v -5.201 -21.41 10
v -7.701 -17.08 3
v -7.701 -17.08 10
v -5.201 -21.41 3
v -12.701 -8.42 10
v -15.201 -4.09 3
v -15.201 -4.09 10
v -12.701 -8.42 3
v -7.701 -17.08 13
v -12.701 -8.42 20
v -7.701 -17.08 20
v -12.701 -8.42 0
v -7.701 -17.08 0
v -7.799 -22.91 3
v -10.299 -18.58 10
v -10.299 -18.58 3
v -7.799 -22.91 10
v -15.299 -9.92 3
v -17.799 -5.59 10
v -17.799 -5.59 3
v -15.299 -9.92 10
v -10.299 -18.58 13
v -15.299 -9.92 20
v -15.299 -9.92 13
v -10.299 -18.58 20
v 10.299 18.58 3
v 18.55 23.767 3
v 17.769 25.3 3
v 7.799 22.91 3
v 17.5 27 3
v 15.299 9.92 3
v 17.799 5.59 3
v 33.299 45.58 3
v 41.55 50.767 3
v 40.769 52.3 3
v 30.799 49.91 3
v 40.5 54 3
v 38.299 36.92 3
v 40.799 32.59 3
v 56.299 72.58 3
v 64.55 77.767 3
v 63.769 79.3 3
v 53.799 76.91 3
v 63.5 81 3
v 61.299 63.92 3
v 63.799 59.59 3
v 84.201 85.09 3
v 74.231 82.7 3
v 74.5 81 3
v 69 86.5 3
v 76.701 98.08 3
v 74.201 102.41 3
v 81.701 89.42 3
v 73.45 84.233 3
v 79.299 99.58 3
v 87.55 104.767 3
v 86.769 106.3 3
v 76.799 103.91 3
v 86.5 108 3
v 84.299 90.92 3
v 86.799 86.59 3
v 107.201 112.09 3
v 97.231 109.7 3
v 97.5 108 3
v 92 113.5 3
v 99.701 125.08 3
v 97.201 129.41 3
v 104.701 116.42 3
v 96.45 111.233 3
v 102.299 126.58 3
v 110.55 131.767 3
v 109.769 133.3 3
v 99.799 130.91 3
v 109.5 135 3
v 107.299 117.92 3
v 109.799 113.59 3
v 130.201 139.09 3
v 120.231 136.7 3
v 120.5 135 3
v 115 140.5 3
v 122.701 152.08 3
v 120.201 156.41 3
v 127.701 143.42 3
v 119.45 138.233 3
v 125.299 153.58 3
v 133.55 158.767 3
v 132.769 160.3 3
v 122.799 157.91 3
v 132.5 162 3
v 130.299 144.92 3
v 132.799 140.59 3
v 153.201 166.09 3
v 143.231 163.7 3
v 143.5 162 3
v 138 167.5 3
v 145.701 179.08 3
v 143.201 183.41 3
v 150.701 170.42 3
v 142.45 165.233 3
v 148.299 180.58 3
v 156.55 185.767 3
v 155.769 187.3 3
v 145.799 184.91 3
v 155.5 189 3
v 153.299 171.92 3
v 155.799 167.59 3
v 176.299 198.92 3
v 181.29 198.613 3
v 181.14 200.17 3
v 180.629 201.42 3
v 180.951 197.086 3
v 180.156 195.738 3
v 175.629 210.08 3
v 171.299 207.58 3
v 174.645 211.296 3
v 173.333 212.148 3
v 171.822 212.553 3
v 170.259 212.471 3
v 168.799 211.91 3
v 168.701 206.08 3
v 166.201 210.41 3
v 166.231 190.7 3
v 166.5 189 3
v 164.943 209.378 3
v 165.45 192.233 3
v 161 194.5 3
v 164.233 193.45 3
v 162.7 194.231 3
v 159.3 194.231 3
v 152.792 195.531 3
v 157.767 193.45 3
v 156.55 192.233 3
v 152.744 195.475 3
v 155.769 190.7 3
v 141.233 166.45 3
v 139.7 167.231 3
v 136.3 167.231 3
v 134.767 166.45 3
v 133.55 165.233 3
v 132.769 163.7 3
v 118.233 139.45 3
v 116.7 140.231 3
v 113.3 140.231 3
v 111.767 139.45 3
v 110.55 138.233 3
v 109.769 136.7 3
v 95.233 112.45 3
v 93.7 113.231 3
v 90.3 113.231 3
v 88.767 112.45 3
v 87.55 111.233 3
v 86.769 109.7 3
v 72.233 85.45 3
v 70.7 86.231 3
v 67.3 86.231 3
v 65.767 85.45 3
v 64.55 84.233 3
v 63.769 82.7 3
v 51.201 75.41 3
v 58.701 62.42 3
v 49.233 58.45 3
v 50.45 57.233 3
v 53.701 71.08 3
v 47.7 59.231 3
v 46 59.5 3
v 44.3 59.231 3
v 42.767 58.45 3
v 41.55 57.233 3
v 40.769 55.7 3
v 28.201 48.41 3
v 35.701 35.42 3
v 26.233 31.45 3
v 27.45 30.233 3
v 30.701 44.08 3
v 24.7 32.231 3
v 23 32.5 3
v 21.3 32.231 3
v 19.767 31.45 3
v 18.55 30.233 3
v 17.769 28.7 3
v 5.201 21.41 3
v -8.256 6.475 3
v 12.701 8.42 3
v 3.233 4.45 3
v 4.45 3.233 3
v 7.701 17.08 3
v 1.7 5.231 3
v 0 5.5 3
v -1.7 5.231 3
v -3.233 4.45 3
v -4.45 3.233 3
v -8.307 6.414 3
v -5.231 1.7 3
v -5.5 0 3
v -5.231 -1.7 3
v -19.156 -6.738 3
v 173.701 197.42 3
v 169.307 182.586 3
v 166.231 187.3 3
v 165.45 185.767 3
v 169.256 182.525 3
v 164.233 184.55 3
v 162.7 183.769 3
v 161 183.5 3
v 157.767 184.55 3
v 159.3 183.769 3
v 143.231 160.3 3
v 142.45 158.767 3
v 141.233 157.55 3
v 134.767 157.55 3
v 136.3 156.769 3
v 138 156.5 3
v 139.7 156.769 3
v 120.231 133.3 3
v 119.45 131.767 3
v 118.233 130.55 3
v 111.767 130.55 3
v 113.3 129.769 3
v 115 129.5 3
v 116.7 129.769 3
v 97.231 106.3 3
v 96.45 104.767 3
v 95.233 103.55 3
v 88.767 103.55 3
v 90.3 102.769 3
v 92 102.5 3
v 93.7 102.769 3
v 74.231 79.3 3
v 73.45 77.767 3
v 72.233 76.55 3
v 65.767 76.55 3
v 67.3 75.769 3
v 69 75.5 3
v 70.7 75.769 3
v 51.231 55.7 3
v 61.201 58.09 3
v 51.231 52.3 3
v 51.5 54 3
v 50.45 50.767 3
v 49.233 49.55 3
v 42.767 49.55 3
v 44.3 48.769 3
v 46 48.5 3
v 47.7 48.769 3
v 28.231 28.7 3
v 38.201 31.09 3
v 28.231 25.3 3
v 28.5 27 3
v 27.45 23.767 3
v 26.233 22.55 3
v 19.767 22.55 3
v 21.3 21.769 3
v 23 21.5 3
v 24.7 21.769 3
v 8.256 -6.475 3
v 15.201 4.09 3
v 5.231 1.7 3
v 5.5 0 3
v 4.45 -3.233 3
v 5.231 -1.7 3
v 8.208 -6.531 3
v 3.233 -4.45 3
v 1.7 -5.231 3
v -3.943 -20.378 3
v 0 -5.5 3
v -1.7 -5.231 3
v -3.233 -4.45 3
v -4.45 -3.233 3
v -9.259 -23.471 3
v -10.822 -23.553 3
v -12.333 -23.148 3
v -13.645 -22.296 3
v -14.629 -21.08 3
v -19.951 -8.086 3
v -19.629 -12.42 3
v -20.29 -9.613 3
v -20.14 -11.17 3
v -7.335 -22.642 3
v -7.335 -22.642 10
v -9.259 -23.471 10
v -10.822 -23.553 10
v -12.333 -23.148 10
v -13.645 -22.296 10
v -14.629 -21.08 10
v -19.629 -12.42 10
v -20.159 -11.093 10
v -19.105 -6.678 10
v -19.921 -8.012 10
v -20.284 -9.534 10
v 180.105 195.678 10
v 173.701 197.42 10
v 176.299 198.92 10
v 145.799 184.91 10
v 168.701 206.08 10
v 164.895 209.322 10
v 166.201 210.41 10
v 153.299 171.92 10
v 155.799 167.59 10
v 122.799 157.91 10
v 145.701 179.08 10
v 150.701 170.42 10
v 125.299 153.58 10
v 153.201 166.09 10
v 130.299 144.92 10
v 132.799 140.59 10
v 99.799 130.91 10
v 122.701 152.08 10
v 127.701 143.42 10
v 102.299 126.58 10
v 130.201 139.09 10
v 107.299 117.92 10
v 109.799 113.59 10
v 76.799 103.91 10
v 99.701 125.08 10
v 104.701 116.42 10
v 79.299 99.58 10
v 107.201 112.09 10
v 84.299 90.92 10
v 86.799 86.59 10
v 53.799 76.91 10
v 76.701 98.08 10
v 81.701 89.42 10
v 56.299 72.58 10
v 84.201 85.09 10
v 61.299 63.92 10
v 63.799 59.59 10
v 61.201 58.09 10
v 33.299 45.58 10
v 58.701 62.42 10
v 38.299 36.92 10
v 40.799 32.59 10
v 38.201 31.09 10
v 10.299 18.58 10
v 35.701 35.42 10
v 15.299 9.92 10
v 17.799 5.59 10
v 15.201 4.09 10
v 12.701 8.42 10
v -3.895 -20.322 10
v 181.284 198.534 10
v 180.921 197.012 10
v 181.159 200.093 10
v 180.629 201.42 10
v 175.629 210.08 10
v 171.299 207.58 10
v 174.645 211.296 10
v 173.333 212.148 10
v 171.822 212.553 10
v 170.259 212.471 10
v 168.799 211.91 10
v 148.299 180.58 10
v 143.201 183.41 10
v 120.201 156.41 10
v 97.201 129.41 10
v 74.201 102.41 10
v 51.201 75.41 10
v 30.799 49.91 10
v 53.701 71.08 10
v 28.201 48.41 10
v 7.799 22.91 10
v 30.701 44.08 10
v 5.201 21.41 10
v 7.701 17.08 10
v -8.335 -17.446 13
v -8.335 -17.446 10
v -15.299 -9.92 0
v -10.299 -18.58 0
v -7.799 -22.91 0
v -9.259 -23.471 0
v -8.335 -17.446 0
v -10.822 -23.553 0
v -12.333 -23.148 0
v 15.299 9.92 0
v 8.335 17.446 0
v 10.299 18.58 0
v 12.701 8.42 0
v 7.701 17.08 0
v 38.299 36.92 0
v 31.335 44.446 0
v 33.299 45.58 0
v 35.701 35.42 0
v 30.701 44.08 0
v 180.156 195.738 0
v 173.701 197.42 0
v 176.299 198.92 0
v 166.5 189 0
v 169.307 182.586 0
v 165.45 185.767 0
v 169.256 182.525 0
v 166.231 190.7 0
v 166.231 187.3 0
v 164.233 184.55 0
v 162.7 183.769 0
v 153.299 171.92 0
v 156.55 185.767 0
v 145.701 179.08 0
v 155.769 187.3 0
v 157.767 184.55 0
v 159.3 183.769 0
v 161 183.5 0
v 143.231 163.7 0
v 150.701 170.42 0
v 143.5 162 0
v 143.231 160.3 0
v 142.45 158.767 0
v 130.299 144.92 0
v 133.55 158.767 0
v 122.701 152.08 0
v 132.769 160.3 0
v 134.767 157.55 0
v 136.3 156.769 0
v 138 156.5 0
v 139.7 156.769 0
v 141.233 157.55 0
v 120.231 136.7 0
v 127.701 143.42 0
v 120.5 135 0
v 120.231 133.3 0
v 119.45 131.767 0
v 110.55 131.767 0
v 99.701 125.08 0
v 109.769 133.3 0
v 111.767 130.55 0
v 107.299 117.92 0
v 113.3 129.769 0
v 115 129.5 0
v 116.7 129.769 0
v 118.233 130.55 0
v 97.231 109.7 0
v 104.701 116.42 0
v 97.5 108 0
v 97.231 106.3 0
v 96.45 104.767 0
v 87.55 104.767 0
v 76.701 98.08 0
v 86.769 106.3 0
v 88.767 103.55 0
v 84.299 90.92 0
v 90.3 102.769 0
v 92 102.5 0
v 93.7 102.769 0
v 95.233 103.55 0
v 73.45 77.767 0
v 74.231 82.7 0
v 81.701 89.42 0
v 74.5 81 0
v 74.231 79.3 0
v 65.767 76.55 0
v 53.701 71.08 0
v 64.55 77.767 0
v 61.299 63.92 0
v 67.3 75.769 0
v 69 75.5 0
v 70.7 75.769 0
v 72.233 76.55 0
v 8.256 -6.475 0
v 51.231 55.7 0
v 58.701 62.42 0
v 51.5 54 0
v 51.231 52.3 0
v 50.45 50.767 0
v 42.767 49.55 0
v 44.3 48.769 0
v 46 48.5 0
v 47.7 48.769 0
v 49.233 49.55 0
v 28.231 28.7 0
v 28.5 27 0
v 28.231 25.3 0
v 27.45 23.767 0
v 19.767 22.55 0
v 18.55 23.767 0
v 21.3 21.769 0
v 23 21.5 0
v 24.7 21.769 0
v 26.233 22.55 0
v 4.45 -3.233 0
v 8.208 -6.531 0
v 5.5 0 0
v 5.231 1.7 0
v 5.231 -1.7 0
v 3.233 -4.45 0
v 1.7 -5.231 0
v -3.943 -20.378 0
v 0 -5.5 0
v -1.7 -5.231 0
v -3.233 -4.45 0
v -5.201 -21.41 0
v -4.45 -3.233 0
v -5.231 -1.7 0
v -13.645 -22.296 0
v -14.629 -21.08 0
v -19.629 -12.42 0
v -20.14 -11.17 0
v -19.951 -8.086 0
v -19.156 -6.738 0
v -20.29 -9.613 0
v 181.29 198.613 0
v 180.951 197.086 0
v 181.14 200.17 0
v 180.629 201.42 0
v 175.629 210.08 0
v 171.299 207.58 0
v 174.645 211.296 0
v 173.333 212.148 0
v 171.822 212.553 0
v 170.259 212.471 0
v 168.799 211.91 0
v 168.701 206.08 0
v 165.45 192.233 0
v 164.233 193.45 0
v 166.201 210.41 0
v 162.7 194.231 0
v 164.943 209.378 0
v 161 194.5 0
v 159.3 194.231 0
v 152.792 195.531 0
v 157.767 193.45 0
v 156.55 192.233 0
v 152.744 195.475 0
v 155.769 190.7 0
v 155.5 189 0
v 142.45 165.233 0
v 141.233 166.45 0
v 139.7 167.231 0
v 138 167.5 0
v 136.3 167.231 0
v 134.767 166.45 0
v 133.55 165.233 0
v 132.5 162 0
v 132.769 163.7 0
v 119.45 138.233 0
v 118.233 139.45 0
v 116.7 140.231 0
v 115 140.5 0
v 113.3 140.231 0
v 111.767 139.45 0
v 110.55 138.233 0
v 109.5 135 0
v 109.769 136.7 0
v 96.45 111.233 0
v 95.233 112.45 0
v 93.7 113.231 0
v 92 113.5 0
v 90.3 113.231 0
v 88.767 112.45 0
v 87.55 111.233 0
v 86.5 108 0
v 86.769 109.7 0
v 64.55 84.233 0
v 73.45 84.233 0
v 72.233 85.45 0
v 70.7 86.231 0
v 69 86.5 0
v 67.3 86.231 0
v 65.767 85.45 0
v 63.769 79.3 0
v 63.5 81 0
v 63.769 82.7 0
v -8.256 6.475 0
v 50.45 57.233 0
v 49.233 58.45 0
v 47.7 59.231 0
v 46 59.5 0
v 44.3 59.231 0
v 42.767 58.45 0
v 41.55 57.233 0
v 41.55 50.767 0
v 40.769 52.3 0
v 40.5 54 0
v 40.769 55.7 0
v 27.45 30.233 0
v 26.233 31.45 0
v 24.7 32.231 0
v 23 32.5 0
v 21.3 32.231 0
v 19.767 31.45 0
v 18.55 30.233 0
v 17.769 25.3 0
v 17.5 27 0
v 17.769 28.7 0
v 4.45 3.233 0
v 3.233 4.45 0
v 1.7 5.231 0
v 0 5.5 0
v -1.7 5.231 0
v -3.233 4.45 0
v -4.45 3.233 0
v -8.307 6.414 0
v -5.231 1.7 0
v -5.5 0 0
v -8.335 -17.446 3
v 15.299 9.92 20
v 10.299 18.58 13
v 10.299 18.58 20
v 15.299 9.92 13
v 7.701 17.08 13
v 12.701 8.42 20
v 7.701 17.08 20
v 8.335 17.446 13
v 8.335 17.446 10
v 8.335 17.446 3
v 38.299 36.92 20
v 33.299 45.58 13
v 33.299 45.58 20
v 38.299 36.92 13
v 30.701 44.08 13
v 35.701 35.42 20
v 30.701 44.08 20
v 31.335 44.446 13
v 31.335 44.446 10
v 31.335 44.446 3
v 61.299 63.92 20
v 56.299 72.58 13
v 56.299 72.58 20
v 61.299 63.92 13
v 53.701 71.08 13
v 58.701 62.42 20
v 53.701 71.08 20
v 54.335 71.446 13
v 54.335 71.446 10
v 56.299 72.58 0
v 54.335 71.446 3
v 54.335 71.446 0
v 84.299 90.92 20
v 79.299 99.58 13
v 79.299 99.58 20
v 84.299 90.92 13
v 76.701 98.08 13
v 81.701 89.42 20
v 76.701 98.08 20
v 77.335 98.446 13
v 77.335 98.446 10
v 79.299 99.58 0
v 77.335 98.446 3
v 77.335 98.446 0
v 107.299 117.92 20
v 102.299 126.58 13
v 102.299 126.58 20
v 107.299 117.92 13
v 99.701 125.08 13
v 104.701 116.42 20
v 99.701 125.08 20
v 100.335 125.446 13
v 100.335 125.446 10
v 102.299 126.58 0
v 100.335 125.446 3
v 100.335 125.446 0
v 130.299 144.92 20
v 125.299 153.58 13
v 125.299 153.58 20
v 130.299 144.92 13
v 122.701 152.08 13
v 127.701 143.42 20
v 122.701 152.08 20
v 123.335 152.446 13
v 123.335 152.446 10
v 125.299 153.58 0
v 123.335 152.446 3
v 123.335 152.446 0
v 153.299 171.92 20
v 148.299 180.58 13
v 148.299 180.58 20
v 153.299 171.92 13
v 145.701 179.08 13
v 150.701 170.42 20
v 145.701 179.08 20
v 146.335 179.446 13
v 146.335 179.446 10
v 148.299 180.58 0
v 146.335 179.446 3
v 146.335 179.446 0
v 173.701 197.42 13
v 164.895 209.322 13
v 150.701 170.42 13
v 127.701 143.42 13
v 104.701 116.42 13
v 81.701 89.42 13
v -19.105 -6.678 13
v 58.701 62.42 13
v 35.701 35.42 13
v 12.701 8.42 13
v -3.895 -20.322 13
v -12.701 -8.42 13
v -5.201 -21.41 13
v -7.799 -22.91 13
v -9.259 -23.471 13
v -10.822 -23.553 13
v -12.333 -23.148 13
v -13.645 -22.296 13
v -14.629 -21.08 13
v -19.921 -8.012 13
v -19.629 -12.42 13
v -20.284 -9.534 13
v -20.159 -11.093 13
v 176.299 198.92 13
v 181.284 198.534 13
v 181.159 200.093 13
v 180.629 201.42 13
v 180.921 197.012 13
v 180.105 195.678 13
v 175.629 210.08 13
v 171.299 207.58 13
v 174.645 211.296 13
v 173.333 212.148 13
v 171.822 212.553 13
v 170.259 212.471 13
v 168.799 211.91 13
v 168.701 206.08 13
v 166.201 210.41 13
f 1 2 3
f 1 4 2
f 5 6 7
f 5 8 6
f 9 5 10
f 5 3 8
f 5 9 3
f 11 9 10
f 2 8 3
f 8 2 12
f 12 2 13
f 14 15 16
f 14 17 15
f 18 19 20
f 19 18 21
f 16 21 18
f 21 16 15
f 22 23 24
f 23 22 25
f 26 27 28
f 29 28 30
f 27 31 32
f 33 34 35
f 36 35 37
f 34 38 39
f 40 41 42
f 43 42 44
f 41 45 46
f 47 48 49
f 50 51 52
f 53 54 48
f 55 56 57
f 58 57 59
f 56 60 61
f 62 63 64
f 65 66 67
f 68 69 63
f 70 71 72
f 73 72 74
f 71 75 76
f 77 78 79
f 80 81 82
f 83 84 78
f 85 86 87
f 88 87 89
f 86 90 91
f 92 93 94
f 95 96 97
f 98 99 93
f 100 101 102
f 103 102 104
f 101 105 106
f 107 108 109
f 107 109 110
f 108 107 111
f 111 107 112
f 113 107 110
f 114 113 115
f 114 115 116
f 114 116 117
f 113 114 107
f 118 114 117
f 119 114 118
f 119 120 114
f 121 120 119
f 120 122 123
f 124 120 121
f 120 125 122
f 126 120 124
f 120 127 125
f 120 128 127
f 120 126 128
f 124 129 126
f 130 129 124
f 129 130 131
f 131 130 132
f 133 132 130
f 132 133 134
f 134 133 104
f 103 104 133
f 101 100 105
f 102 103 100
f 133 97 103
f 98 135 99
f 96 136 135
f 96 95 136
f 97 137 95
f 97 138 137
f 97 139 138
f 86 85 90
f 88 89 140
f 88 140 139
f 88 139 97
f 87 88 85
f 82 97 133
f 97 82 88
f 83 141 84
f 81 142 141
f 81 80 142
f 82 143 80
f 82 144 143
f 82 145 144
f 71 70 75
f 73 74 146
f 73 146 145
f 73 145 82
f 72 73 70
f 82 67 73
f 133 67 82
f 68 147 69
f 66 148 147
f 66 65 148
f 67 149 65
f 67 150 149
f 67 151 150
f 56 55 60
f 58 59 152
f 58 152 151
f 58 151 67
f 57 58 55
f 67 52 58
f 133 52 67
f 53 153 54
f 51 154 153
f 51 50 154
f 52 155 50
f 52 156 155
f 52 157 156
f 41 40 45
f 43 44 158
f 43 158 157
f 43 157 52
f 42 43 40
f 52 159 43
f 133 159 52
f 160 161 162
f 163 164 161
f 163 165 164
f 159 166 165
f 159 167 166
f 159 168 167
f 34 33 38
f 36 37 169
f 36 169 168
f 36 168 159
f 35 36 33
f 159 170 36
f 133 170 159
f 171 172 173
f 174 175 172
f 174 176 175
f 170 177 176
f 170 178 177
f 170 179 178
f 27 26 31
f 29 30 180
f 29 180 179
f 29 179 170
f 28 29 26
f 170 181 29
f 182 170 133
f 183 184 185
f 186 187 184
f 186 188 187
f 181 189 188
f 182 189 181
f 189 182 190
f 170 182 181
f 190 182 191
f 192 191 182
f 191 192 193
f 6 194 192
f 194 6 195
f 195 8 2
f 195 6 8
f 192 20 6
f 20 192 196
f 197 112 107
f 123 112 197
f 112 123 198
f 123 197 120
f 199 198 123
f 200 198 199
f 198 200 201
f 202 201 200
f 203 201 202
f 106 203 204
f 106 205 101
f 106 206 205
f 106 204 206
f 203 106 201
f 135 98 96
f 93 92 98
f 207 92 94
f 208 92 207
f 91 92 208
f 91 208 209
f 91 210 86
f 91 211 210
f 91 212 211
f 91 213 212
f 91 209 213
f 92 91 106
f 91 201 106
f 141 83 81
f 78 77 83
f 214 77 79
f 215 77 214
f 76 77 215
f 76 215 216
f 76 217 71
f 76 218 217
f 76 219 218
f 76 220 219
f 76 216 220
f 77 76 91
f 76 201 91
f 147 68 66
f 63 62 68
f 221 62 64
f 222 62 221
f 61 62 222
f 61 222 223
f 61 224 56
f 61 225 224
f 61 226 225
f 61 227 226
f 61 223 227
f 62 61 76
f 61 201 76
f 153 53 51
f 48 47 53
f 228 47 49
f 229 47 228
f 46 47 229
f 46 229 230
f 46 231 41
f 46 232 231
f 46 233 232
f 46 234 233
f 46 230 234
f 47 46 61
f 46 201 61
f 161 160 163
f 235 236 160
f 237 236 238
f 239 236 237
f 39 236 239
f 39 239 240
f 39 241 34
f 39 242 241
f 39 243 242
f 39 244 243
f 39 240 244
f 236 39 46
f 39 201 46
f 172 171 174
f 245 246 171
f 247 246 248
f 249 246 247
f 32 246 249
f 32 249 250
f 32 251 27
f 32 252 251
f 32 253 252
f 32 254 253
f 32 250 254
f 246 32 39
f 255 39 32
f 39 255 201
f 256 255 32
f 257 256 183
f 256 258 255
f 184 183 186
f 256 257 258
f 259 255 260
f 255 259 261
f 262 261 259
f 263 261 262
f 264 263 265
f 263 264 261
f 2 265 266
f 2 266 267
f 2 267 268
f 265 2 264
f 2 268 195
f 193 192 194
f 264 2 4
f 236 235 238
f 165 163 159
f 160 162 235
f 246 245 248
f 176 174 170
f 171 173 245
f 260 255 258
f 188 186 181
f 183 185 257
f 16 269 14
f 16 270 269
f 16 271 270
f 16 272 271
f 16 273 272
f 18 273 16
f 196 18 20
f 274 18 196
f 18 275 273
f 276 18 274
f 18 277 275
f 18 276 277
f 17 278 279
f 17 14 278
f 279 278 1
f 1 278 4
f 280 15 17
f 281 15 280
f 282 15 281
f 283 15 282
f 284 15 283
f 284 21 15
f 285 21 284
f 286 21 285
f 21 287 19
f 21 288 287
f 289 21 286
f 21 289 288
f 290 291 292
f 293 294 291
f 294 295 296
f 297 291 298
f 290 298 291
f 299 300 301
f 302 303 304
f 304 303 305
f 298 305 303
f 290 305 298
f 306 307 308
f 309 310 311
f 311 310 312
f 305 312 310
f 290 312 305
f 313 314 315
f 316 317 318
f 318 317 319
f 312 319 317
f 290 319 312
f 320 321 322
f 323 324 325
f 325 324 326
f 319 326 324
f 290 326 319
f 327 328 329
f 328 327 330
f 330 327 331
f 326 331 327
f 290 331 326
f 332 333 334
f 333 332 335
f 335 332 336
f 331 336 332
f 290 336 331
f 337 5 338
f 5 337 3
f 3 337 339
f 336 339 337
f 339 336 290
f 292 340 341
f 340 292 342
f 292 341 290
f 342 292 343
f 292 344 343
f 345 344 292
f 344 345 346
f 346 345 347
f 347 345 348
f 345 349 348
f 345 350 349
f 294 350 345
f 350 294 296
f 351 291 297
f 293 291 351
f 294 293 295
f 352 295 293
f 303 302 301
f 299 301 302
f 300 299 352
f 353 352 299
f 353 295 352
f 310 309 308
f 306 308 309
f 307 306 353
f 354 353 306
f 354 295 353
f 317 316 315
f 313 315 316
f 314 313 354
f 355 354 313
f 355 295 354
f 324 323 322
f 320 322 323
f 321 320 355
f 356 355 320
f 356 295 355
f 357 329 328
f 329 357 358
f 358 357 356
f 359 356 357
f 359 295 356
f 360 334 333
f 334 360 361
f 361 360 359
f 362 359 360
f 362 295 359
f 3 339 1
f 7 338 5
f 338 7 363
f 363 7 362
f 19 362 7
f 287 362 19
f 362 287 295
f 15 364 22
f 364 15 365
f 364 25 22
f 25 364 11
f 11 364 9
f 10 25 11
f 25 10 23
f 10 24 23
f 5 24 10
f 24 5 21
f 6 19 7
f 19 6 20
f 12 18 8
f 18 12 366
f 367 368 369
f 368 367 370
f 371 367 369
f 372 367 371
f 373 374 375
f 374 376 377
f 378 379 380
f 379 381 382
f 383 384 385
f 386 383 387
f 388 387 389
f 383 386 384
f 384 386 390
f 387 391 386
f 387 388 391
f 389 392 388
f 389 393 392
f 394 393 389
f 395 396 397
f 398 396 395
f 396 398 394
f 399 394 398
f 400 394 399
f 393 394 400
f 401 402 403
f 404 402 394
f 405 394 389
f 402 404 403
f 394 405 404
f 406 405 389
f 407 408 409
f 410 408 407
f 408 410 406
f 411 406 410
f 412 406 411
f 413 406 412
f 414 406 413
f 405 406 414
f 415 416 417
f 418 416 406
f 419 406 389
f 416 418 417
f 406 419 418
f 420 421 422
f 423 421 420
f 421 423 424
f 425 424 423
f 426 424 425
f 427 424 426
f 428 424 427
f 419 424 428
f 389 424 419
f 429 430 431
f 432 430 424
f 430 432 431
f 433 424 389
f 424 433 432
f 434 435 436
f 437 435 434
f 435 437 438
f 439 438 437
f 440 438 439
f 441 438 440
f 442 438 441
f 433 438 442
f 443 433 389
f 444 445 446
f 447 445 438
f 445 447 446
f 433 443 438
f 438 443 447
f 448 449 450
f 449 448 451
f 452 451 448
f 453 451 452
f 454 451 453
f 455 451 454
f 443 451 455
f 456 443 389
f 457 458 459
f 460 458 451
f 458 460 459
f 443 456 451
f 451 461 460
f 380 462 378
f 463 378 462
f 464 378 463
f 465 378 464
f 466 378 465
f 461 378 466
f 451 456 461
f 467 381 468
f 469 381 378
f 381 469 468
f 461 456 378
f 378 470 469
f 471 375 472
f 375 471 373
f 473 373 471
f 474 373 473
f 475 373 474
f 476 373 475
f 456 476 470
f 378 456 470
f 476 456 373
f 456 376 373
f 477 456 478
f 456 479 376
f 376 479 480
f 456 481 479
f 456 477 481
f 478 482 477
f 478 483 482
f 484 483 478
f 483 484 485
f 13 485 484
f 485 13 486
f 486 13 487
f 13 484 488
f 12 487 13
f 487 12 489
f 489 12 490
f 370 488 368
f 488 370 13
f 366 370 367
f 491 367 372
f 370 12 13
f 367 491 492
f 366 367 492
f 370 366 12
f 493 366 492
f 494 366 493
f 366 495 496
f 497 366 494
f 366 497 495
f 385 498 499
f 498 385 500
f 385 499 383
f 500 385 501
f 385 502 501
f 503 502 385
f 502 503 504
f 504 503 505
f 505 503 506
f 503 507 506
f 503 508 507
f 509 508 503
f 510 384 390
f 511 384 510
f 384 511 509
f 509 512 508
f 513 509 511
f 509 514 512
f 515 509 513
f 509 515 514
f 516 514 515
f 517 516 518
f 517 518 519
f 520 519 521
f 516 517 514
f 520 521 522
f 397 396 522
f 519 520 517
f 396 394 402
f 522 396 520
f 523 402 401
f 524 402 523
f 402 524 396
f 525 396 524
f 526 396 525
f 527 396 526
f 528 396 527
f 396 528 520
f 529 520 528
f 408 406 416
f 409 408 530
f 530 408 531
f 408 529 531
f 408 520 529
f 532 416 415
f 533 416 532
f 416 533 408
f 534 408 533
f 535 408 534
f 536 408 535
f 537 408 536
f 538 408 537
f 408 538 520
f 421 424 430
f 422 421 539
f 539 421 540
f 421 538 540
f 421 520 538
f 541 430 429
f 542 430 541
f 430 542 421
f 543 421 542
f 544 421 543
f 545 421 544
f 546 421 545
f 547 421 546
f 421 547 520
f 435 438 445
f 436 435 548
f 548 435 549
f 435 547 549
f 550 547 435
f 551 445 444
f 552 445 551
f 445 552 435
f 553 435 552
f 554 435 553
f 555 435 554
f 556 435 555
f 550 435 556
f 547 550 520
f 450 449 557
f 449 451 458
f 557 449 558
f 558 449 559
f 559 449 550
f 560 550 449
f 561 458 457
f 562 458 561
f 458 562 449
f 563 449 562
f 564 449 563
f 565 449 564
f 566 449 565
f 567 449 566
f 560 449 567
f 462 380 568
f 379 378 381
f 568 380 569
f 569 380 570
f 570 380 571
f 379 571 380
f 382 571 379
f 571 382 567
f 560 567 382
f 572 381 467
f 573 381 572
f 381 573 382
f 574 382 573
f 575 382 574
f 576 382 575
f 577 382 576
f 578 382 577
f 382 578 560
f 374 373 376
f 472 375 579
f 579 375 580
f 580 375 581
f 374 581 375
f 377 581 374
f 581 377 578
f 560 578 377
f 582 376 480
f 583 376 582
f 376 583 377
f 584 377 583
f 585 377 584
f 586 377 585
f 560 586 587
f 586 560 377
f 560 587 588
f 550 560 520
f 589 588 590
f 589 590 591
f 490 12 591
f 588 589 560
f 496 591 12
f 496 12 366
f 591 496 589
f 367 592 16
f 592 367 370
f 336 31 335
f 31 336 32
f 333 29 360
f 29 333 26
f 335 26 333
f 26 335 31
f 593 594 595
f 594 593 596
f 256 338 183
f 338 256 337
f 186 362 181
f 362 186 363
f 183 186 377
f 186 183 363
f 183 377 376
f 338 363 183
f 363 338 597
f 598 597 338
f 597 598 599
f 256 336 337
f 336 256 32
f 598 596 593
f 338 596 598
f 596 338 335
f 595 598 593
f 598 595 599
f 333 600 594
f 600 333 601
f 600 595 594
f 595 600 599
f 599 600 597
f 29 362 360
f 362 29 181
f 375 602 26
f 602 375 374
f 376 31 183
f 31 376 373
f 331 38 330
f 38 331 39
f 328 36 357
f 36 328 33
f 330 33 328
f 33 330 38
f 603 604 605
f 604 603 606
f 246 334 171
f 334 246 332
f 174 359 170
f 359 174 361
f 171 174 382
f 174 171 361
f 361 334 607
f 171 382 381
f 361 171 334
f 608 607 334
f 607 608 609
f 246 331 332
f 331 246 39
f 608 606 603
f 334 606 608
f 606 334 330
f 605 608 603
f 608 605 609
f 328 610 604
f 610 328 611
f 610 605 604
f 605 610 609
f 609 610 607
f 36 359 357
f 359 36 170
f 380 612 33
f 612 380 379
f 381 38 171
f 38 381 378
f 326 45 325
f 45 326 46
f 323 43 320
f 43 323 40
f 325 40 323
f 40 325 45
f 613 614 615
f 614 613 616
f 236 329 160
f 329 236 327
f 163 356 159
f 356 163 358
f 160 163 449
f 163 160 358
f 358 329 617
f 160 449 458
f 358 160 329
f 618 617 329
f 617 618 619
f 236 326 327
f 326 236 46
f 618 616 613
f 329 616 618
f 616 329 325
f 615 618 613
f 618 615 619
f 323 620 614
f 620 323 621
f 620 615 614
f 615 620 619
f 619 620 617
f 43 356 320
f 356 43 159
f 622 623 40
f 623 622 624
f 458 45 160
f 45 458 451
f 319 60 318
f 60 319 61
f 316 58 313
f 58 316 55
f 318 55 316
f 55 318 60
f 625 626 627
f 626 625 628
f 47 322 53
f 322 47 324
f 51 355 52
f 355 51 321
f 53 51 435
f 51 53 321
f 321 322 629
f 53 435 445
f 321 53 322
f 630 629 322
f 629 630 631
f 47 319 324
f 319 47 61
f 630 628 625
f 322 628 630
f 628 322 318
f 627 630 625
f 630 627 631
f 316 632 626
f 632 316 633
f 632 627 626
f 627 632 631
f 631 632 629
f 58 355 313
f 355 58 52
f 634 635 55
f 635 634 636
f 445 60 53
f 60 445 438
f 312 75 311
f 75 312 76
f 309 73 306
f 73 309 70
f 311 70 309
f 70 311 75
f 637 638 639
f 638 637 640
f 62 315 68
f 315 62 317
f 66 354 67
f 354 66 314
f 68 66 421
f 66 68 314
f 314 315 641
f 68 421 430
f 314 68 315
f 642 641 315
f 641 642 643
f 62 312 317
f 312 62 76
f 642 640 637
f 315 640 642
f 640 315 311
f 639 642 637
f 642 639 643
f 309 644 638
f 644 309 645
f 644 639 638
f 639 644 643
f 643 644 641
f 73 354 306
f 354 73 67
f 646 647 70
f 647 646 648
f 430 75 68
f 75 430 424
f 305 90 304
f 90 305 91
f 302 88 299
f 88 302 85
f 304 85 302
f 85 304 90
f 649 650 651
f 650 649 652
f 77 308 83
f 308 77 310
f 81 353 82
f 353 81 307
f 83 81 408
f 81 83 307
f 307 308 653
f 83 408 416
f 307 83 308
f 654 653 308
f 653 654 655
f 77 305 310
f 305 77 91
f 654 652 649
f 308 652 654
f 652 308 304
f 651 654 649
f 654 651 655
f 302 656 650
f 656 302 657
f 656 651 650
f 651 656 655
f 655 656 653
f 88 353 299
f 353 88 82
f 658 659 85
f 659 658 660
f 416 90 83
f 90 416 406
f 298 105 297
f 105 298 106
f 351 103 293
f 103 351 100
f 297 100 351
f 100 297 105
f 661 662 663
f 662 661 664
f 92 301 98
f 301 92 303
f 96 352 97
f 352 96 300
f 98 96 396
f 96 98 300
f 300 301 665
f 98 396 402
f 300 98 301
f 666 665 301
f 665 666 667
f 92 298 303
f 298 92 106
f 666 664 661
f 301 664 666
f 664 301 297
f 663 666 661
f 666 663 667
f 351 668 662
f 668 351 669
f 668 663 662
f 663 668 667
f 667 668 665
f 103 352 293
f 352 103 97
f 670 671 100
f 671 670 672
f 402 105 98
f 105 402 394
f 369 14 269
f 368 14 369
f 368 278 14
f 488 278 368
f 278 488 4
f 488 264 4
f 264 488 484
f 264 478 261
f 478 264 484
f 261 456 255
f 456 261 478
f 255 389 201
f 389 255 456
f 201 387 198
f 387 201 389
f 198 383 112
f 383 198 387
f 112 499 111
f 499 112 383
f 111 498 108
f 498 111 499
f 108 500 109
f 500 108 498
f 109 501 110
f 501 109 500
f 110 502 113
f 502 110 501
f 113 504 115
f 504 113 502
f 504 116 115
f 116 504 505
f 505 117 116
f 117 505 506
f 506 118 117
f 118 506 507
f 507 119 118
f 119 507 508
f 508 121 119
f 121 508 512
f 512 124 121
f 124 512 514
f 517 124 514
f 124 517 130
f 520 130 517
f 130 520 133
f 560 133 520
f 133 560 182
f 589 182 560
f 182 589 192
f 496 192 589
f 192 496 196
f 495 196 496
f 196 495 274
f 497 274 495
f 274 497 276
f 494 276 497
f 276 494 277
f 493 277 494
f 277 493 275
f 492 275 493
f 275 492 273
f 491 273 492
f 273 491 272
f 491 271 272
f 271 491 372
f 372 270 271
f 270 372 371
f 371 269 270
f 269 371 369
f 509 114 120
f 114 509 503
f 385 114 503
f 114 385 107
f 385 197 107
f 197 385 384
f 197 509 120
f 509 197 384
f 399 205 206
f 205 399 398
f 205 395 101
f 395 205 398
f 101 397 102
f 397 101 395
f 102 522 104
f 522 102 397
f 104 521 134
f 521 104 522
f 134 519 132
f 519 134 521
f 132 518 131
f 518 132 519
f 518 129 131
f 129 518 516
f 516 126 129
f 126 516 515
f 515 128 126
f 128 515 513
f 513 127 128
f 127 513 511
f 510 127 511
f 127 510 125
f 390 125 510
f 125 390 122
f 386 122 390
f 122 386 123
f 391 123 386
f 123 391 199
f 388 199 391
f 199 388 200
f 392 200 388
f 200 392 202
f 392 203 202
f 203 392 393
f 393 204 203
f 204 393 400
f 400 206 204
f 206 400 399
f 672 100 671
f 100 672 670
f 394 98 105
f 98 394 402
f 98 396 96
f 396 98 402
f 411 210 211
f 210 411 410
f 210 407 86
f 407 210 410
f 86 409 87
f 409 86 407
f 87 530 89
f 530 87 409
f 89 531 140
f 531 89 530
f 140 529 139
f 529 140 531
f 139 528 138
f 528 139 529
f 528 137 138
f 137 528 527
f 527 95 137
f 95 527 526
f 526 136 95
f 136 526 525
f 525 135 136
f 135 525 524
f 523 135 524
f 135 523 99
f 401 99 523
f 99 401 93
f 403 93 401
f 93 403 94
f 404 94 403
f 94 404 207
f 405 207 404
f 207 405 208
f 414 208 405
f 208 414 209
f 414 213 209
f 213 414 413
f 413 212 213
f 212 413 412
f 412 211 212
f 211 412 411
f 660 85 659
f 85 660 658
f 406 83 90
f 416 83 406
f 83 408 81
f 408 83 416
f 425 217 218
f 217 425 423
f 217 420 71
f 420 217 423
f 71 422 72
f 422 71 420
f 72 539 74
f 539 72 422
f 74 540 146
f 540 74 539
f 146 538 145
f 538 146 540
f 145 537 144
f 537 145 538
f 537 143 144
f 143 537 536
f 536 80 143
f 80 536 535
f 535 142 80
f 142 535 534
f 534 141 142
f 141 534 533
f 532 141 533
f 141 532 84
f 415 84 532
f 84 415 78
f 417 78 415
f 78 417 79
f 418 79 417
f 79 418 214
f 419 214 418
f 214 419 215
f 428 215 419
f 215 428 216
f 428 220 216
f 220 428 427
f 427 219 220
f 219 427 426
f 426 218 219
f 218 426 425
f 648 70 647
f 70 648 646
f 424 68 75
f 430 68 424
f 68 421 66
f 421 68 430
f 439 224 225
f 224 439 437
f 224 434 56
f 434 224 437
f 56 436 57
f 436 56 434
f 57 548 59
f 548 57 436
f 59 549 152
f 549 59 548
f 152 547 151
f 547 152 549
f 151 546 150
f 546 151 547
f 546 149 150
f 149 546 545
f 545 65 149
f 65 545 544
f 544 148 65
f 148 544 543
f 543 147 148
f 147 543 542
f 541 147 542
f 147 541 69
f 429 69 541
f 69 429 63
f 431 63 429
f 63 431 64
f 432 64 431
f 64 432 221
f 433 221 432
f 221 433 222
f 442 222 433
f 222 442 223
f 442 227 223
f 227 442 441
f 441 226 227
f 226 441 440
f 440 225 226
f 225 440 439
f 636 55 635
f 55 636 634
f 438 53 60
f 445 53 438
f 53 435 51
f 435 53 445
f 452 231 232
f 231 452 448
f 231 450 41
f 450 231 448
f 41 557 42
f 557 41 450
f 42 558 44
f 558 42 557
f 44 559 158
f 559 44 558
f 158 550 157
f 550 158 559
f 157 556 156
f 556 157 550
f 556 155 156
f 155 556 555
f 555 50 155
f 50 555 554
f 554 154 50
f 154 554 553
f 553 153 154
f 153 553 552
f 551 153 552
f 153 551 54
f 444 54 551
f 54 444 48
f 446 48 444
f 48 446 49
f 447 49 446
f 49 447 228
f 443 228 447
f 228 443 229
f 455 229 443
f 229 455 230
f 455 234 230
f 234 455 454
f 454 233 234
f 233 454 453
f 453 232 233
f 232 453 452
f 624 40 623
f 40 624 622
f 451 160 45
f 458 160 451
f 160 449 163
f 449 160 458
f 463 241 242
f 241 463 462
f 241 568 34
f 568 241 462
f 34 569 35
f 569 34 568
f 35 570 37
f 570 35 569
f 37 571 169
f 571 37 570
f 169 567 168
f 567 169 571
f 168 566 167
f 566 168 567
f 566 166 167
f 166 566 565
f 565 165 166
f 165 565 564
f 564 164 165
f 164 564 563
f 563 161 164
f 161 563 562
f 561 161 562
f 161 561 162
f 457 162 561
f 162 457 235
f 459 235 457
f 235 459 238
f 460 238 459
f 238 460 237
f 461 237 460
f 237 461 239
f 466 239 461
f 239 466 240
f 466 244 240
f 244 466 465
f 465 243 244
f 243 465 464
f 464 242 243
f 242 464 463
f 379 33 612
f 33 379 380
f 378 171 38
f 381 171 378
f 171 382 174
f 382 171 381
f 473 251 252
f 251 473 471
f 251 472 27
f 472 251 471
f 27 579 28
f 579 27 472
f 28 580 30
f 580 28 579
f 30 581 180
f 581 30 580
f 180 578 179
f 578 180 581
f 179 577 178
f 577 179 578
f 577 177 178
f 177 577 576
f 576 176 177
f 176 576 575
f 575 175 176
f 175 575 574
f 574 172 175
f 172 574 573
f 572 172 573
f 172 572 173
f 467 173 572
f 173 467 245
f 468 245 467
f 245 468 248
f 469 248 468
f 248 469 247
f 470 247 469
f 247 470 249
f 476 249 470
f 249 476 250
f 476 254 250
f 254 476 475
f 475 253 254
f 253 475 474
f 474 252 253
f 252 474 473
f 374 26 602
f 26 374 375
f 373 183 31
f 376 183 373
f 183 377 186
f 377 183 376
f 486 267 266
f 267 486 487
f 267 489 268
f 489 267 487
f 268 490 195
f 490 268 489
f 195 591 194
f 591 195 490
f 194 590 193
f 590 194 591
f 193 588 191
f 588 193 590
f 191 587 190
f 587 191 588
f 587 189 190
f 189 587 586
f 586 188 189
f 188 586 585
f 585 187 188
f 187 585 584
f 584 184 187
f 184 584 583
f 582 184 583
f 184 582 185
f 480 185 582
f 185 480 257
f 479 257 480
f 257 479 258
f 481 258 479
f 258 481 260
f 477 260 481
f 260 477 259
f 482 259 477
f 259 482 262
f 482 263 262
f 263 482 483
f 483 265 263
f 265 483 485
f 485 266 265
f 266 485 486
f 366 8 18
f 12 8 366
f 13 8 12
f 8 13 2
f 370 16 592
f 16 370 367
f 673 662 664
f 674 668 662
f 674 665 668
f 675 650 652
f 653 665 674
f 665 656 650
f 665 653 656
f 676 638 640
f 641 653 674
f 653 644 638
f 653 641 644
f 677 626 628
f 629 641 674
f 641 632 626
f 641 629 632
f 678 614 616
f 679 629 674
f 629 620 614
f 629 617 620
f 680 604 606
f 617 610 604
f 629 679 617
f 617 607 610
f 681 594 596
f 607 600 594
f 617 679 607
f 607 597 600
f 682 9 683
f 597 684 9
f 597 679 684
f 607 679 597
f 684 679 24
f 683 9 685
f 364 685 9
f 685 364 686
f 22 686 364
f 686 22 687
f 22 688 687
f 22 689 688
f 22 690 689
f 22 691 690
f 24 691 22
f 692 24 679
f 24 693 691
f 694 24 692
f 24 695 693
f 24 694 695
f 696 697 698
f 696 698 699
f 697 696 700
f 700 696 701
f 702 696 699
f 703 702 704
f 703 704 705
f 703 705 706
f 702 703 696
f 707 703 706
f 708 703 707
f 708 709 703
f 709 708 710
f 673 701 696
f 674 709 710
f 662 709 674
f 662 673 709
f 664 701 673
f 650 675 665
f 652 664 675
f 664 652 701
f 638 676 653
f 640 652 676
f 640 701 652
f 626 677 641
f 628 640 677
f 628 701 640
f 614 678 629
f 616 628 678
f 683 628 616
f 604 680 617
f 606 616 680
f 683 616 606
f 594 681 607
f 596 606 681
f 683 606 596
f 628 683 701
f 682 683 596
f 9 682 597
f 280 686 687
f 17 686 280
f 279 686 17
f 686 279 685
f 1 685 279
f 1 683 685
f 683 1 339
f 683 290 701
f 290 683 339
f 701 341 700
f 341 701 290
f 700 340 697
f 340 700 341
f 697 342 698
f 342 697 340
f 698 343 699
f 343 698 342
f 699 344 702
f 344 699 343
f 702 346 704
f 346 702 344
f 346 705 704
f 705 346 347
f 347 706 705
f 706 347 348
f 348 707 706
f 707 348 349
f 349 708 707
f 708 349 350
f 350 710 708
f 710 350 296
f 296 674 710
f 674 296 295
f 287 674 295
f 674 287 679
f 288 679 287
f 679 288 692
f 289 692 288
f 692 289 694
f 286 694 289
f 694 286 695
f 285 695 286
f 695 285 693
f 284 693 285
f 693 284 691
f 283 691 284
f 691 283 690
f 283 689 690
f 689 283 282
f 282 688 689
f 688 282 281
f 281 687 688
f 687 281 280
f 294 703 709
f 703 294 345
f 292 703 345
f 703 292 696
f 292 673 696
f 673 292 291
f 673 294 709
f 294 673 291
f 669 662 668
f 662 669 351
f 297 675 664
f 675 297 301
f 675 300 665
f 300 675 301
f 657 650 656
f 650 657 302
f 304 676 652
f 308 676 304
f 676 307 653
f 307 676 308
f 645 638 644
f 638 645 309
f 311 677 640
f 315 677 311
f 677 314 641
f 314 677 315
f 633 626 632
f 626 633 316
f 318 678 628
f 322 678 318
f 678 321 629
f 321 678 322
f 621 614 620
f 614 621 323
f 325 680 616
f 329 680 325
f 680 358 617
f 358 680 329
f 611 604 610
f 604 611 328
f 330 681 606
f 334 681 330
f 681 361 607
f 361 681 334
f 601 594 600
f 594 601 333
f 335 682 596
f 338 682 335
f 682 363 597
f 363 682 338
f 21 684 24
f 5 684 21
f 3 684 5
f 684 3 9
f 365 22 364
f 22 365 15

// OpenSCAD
// file: globs.scad
/* Global definitions for millihertz 5 */

// Ball bearings are sold as 6mm. We have seen two
// versions, one at 6.35mm (1/4") and one at 6.15mm.

ball_bearing_diameter = 6.35;
ball_bearing_radius = ball_bearing_diameter / 2;
pipe_outer_diameter = 11;
pipe_inner_diameter = 8;

/* All dimensions are in millimetres */
memory_slope = 10; // Degrees

/** Memory cell pitch - the horizontal and vertical distances between one row and the next. Memory is arranged so one column (y) make up one word. Words are laid out vertically. */
memory_cell_pitch_x = 16;
memory_cell_pitch_y = 28 * cos(memory_slope);

// Max wire diameter is 1.59mm for 6.35mm ball bearings.
stage1_wire_diameter = 1.45; // Equivalent to AWG 15 / SWG 17.
stage2_wire_diameter = 2.337; // SWG 13

/* Number of bits used in the data. This must be 32. */
bits = 32;

/* Global pitch - the horizontal spacing between each bit */
pitch = 23;

/** Frame */

frame_internal_width = 900;
frame_internal_height = 2200;

/** Frame will probably be 50mm angle iron */
frame_width = 50;

/* Bowden cable specs based on lightweight 'snake' cable */

bowden_cable_inner_diameter = 2;
bowden_cable_outer_diameter = 3.5;

bowden_cable_travel = 10;

/* Specific names for the subtractor */
subtractor_pitch_x = pitch;
subtractor_pitch_y = 27;

memory_columns_per_cell = 8;

// Memory cell height
cell_height = 14;

// Gap between two memory cell units - allows for the last useless row
// in the cell and a gap of 20 to place a delay unit if necessary. The
// delay unit may be needed to slow the ball bearing to avoid damage to
// memory selectors.
memory_unit_gap = cell_height+20;

// centre_gap is a split in the middle of the two lanes
// to join cells together (since we will likely have two
// 16-bit memory cells, and 2 16-bit adders, there will
// be a gap needed to join them.
centre_gap = 50;

/* Colour for illustrating ball bearing paths */

bb_trace_colour = [0.5,0.0,0.0,0.5];


channel_width = 7; // Width of channels ball bearings roll in

columns_per_block = 8; // Number of columns in each injector/diverter block

enumerator_rod_travel = 7;

// Used mainly by injector
function ejector_xpos(col) = 20+col*pitch+channel_width/2;


//Operator modules to produce acrylic plates easily
module vertical_plate_x()
{
  rotate([90,0,0]) linear_extrude(height=3) children();
}

module vertical_plate_y()
{
  rotate([0,0,90]) rotate([90,0,0]) linear_extrude(height=3) children();
}

module horizontal_plate()
{
  linear_extrude(height=3) children();
}


// Distance between vertical support rails (centre to centre). This is for the internal rails. There are larger superrails which connect over longer distances.
support_rail_separation = 250;

// 250mm separation gives 235mm internal spacing between bars


// Canonical channel 0 position - the leftmost channel - should be 30mm right of the centre of the rail.

/*
     30mm
   <------>
 15mm     v
<---->    v
|    |    v
|BEAM|    v
|    |    v

*/


hex_bar_af = 4.75; // 6BA hex bar from Noggin End Metals measured as 4.75mm AF.

// Calculate the max radius of the bar
hex_bar_max_radius = (hex_bar_af / 2) / cos(30);

module hex_bar_2d() {
    r = hex_bar_max_radius;
    polygon(points = [ [ r * cos(0), r * sin(0) ],
		       [ r * cos(60), r * sin(60) ],
		       [ r * cos(120), r * sin(120) ],
		       [ r * cos(180), r * sin(180) ],
		       [ r * cos(240), r * sin(240) ],
		       [ r * cos(300), r * sin(300) ] ]);
}
// main file
// This is an input adaptor for the subtractor. This is designed for the older model subtractor (with sharp corners) but should work on the new one as well.

include <globs.scad>;

$fn = 20;

slope = atan2(subtractor_pitch_y, subtractor_pitch_x);
echo(slope);
module input_holes() {
  for(i=[0:7]) {
    translate([pitch*i, i*subtractor_pitch_y]) circle(d=pipe_outer_diameter);
  }
}

module divider_slots() {
  for(i=[0:8]) {
    translate([-pitch/2 + pitch*i, i*subtractor_pitch_y-subtractor_pitch_y/2]) rotate(30) square([3,10],center=true);
  }
}

module divider_2d() {
  union() {
    square([10,20],center=true);
    translate([0,-3.5]) {
      square([20,7],center=true);
    }
  }
}


module input_adaptor_2d() {
  difference() {
    offset(r=5) {
      hull() {
	input_holes();
	divider_slots();
      }
    }
    input_holes();
    divider_slots();
  }
}


module central_plate_2d() {
  difference() {
    offset(r=5) {
      hull() {
	divider_slots();
      }
    }
    divider_slots();
  }
}

linear_extrude(height=3) input_adaptor_2d();
translate([0,0,10]) linear_extrude(height=3) central_plate_2d();
for(i=[0:7]) {
  translate([pitch*i, subtractor_pitch_y*i, 0]) {
    translate([-pitch/2, -subtractor_pitch_y/2,10]) rotate([0,0,-60]) translate([0,1.5,0]) rotate([90,0,0]) color([1.0,0,0]) linear_extrude(height=3) divider_2d();
  }
 }
